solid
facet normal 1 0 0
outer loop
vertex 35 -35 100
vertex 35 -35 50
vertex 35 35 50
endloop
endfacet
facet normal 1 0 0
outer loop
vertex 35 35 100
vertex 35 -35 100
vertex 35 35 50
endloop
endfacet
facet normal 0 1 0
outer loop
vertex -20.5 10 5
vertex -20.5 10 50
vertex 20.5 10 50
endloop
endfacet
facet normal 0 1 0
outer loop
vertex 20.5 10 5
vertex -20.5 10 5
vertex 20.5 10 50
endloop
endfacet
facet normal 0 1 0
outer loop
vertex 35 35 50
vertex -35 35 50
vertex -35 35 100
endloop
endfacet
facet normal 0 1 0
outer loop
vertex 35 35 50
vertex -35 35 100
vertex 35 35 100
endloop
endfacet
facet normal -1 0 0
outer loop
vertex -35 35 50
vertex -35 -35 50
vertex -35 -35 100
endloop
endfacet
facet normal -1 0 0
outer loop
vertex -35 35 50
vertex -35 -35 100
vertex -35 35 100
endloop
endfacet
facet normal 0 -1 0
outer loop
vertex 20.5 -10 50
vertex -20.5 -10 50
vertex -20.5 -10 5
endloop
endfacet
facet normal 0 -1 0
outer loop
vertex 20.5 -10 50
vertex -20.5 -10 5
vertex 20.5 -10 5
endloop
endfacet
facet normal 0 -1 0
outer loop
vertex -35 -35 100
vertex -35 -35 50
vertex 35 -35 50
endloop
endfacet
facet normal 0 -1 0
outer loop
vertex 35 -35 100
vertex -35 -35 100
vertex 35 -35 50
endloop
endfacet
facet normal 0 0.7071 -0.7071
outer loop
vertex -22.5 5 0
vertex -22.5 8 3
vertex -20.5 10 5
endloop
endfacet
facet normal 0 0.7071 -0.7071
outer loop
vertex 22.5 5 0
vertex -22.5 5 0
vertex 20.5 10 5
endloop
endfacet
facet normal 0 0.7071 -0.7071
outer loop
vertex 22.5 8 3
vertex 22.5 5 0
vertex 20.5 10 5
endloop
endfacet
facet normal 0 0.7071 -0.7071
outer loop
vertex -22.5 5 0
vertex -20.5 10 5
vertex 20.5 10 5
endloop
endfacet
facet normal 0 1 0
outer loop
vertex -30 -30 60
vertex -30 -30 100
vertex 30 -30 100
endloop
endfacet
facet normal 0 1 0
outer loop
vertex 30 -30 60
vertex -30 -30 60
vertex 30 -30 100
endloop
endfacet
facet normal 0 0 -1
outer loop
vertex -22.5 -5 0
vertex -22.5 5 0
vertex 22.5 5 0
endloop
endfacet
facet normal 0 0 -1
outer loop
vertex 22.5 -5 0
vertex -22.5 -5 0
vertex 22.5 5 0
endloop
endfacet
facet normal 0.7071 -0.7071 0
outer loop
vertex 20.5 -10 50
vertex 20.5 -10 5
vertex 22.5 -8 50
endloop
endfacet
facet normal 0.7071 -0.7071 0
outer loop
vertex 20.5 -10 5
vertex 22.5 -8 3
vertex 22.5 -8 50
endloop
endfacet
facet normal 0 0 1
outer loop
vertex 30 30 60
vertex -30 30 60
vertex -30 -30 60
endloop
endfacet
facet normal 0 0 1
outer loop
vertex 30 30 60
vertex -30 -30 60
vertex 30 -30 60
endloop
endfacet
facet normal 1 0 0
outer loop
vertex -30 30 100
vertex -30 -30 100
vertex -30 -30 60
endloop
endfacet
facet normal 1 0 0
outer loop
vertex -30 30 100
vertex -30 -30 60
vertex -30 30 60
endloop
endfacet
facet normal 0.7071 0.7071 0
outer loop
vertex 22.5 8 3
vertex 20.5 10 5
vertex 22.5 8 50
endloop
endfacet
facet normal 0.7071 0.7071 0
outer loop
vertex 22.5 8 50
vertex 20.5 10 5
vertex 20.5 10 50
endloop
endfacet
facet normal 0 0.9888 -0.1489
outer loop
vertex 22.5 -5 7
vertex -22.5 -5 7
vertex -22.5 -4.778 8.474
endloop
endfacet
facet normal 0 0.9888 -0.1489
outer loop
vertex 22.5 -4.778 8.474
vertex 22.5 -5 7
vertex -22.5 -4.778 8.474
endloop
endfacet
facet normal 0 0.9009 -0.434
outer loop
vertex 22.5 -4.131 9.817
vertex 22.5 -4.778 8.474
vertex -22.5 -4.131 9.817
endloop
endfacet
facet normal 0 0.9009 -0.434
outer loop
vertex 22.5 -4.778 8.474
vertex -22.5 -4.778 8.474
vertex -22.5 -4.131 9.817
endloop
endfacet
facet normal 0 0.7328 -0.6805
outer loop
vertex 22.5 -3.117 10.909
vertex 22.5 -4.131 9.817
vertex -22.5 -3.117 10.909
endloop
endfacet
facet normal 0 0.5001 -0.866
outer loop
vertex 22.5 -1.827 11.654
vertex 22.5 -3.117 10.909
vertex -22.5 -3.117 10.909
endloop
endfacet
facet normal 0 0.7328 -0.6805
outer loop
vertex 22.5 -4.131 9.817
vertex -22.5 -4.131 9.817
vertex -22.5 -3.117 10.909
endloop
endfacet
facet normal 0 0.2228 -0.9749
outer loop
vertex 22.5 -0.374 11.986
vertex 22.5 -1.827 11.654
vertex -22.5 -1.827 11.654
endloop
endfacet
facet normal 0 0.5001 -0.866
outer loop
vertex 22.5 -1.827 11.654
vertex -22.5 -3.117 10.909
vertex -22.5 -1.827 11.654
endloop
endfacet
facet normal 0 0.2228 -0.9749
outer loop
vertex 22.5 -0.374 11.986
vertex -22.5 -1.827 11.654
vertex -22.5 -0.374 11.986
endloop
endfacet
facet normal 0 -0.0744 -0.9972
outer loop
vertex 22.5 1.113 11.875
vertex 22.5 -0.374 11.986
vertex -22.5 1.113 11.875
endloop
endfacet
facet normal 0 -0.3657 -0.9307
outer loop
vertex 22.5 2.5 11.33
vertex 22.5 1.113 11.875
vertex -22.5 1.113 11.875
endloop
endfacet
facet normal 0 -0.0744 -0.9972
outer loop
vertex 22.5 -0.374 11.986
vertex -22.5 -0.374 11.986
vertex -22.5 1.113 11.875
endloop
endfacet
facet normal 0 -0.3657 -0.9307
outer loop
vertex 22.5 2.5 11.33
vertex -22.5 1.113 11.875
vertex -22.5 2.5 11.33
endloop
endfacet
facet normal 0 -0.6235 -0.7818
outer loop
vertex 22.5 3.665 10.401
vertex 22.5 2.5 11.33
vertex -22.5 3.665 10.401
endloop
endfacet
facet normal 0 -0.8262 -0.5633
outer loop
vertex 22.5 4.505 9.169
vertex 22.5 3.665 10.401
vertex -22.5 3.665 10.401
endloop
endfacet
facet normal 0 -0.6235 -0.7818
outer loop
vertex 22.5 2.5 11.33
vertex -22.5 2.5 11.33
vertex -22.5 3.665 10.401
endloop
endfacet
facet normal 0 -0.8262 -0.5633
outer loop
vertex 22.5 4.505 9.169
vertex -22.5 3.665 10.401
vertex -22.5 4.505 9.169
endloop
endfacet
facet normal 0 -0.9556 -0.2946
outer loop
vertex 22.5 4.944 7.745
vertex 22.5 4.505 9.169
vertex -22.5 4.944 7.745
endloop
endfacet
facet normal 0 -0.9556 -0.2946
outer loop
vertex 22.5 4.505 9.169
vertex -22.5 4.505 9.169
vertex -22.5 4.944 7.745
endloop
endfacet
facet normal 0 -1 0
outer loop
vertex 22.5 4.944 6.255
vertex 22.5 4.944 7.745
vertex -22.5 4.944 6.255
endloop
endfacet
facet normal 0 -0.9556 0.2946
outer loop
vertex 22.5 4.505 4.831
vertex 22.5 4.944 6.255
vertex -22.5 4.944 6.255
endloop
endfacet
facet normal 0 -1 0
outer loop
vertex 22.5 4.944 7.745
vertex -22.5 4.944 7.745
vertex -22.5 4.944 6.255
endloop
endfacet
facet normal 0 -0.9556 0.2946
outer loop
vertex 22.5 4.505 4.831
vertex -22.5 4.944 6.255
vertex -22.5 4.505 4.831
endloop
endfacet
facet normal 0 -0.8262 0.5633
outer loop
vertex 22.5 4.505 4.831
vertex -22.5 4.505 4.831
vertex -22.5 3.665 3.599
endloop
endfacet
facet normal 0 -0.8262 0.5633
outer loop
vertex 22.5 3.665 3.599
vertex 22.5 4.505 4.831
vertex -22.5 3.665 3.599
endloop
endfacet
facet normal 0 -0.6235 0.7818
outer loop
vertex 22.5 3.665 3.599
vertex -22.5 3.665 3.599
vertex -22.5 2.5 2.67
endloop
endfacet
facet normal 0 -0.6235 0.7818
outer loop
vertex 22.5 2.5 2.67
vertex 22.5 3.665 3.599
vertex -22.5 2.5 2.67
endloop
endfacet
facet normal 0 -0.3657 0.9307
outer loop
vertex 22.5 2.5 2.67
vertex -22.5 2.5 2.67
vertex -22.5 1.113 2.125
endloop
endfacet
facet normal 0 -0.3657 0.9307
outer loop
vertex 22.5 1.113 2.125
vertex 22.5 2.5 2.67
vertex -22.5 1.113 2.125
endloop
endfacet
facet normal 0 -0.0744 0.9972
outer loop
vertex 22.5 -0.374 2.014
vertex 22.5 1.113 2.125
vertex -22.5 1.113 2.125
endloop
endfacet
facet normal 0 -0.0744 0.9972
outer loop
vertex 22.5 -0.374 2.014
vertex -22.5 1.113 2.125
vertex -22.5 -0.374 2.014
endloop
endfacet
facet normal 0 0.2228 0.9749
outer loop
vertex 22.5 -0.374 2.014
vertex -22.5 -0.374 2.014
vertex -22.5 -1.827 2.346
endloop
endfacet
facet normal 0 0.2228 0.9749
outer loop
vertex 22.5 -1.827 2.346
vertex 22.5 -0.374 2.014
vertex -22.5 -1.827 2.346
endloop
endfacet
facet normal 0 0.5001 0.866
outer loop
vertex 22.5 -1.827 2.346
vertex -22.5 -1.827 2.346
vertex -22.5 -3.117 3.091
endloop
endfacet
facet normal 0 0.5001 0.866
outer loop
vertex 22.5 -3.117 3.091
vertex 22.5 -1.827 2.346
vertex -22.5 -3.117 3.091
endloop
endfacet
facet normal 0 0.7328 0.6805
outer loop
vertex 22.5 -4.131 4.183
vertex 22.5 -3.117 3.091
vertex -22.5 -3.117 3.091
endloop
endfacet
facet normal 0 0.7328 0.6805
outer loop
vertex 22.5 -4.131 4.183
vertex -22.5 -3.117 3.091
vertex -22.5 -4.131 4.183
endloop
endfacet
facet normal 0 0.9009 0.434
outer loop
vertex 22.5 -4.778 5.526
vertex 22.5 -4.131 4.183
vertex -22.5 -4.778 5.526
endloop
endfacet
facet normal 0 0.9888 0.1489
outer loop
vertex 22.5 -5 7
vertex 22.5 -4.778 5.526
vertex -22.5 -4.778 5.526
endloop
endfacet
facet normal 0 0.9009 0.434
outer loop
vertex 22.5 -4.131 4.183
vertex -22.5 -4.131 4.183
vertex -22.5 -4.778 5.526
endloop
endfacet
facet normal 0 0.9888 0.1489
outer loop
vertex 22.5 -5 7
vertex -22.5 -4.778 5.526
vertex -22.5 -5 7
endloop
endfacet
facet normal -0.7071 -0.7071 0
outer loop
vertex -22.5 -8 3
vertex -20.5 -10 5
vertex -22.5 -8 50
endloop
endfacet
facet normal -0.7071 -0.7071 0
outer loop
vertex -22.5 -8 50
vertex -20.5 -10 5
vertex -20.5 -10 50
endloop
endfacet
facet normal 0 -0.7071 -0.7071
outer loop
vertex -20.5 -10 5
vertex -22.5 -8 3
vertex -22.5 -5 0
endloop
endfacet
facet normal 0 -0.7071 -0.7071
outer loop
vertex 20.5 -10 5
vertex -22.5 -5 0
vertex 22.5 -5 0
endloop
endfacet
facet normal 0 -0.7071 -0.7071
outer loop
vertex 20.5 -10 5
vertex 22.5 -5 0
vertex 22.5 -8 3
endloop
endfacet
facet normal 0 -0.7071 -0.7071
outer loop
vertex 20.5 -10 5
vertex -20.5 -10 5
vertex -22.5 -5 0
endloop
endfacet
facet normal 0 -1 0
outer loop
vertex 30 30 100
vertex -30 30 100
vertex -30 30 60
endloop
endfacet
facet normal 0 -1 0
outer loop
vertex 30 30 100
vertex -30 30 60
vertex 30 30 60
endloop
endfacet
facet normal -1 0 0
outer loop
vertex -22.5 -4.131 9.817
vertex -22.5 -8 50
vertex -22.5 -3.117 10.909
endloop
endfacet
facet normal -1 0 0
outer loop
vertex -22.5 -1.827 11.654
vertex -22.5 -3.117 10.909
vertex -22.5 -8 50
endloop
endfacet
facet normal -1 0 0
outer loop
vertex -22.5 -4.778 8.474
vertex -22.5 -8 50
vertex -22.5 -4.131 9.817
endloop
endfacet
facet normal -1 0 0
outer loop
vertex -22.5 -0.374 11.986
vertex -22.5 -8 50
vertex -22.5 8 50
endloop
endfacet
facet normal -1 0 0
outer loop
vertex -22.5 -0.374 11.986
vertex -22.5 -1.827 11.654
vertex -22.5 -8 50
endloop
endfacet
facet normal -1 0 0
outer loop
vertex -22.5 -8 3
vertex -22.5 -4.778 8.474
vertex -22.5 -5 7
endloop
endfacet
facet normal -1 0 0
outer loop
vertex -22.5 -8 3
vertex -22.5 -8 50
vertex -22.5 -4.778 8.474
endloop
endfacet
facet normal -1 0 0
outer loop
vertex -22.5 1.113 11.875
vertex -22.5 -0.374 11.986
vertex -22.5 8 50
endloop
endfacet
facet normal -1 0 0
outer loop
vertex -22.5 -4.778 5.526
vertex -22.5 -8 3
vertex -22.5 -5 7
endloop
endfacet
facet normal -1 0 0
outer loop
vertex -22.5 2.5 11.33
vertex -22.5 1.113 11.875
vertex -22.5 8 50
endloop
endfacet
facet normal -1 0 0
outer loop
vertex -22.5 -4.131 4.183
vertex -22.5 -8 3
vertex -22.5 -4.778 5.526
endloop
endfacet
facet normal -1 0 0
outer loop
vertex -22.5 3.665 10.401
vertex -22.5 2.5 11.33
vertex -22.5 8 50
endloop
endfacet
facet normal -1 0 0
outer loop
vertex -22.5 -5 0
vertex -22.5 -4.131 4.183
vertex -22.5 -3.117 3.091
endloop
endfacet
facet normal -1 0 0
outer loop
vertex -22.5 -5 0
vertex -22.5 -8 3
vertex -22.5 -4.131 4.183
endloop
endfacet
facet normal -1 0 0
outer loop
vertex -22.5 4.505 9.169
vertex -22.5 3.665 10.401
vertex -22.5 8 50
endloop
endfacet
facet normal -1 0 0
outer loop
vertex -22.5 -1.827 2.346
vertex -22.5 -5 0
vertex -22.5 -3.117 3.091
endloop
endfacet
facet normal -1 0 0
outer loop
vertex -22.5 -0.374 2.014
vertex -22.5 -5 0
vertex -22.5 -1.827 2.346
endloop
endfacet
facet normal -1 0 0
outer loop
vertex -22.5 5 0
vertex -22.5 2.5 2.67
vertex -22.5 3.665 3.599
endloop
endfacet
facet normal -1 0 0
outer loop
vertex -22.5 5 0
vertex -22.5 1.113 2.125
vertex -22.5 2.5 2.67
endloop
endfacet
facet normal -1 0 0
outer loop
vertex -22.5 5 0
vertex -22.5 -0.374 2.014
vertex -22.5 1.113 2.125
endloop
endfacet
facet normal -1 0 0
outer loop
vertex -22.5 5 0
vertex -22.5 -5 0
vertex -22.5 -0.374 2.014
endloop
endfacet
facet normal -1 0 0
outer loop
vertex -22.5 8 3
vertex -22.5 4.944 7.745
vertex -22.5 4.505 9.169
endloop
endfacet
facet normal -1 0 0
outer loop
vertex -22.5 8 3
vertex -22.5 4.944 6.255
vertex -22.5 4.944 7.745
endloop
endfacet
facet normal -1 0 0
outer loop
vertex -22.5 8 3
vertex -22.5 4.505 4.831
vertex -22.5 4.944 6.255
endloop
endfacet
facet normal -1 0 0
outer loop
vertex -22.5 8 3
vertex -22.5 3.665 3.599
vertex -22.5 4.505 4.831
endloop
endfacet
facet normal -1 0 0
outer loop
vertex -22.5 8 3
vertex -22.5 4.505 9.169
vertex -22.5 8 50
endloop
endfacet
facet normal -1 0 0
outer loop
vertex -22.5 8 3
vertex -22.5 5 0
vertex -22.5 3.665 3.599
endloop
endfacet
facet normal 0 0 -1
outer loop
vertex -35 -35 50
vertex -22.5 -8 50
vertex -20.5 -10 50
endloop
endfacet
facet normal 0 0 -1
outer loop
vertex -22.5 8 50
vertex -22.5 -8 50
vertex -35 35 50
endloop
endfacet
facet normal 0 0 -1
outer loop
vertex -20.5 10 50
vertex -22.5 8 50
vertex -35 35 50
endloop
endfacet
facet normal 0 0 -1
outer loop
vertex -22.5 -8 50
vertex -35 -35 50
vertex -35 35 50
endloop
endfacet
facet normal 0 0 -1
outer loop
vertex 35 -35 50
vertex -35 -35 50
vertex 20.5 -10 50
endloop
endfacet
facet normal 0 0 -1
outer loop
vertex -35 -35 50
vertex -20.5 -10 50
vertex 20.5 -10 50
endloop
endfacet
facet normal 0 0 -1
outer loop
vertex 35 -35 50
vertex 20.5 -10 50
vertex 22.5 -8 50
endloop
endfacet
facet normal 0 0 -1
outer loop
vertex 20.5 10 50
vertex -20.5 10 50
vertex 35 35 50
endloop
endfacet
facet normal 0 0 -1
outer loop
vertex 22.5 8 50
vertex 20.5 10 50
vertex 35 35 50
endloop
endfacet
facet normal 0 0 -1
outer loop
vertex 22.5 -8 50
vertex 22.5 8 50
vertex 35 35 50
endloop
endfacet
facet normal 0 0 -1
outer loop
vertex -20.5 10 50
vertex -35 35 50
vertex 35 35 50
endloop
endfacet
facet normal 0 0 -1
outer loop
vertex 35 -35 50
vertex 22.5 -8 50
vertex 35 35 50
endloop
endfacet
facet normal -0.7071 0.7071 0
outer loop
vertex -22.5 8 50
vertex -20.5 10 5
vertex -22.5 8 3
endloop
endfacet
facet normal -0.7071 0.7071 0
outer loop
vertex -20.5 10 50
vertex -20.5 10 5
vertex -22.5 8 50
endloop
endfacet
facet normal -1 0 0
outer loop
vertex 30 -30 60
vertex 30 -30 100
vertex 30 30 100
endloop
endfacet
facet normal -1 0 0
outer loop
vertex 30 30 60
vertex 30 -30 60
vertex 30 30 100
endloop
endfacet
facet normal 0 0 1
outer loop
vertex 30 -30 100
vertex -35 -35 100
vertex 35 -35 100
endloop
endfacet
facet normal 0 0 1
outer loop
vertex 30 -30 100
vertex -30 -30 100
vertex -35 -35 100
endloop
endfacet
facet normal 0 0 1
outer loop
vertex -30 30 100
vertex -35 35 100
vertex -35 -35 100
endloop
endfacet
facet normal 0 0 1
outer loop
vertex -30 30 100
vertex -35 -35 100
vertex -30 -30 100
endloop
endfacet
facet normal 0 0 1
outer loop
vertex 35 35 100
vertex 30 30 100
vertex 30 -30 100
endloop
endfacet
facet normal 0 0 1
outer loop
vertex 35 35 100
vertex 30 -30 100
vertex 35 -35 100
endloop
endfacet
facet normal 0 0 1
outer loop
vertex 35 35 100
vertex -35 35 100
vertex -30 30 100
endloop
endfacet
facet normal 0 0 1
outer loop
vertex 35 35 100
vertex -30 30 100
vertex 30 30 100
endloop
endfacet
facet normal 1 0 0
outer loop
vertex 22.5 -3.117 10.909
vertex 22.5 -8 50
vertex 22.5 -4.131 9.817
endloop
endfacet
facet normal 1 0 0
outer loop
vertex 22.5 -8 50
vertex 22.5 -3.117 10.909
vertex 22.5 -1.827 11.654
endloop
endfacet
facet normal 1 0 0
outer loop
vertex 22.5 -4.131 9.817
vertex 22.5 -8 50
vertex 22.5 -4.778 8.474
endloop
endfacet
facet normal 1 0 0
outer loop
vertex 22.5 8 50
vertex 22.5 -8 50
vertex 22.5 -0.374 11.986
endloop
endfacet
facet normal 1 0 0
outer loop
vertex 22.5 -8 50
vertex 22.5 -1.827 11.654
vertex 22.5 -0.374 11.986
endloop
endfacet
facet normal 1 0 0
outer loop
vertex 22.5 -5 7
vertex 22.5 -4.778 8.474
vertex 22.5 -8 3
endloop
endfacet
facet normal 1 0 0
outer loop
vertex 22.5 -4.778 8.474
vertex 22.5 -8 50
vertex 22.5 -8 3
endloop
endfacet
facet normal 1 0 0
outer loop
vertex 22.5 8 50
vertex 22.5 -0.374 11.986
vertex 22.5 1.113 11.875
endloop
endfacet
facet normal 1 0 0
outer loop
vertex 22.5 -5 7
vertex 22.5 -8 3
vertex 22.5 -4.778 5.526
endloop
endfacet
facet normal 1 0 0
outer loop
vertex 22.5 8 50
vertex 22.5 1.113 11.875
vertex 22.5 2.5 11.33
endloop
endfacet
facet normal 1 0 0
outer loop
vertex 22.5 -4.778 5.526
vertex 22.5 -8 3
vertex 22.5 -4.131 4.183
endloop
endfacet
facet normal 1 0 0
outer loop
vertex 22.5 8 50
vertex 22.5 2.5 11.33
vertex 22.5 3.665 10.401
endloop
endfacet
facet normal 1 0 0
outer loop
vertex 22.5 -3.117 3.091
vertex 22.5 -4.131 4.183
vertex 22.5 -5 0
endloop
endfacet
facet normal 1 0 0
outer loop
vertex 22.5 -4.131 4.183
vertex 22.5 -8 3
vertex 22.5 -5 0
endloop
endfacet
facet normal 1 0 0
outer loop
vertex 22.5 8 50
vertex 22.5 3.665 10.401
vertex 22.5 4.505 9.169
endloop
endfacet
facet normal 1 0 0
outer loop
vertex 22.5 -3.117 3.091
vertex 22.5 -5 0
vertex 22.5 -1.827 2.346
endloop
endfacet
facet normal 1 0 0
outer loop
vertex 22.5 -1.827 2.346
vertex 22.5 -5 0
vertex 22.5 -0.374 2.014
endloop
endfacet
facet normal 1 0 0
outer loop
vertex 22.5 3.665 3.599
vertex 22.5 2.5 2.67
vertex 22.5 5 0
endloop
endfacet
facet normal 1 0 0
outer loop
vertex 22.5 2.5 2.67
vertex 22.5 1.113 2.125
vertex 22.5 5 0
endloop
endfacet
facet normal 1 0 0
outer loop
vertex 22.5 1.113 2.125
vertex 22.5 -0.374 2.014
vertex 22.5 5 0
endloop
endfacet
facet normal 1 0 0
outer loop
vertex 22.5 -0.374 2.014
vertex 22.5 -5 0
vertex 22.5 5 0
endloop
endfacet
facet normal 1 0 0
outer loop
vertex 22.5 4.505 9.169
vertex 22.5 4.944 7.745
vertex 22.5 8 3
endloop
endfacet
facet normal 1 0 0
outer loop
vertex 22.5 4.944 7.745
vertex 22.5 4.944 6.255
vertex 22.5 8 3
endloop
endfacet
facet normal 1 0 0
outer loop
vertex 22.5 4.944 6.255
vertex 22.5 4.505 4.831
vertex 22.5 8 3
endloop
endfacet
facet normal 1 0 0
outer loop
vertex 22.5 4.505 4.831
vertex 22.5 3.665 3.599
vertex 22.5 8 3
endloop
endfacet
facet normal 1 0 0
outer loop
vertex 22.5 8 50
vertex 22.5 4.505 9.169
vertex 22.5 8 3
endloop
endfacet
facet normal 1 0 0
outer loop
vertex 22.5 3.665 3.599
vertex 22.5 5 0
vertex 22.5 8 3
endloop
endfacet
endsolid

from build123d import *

# Parameters (mm, degrees)
F0_W     = 45
F0_H     = 20
F1_DEPTH = 50
F3_SIZE  = 2
F4_SIZE  = 5
F2_R     = 5
F5_DEPTH = 45
F6_W     = 70
F6_H     = 70
F7_DEPTH = 50
F8_W     = 60
F8_H     = 60
F9_DEPTH = 40


with BuildPart() as f1:
    # F0 (on Top) → F1 (new body)
    with BuildSketch(Plane.XY):
        Rectangle(F0_W, F0_H)
    extrude(amount=F1_DEPTH)

    # F3
    f3_edges = [f1.edges().sort_by_distance(p)[0] for p in [
        (-22.5, -10, 25),
        (-22.5, 10, 25),
        (22.5, -10, 25),
        (22.5, 10, 25),
    ]]
    chamfer(f3_edges, length=F3_SIZE)

    # F4
    f4_edges = [f1.edges().sort_by_distance(p)[0] for p in [
        (0, 10, 0),
        (0, -10, 0),
    ]]
    chamfer(f4_edges, length=F4_SIZE)

    # F2 (on face) → F5 (cut, through all)
    with BuildSketch(Plane(origin=(-22.5, 0, 0), x_dir=(0, -1, 0), z_dir=(-1, 0, 0))):
        with Locations((0, 7)):
            Circle(F2_R)
    extrude(amount=-F5_DEPTH, mode=Mode.SUBTRACT)

    # F6 (on face) → F7 (join)
    with BuildSketch(Plane.XY.offset(50)):
        Rectangle(F6_W, F6_H)
    extrude(amount=F7_DEPTH)

    # F8 (on face) → F9 (cut)
    with BuildSketch(Plane.XY.offset(100)):
        Rectangle(F8_W, F8_H)
    extrude(amount=-F9_DEPTH, mode=Mode.SUBTRACT)


solid = f1.part
